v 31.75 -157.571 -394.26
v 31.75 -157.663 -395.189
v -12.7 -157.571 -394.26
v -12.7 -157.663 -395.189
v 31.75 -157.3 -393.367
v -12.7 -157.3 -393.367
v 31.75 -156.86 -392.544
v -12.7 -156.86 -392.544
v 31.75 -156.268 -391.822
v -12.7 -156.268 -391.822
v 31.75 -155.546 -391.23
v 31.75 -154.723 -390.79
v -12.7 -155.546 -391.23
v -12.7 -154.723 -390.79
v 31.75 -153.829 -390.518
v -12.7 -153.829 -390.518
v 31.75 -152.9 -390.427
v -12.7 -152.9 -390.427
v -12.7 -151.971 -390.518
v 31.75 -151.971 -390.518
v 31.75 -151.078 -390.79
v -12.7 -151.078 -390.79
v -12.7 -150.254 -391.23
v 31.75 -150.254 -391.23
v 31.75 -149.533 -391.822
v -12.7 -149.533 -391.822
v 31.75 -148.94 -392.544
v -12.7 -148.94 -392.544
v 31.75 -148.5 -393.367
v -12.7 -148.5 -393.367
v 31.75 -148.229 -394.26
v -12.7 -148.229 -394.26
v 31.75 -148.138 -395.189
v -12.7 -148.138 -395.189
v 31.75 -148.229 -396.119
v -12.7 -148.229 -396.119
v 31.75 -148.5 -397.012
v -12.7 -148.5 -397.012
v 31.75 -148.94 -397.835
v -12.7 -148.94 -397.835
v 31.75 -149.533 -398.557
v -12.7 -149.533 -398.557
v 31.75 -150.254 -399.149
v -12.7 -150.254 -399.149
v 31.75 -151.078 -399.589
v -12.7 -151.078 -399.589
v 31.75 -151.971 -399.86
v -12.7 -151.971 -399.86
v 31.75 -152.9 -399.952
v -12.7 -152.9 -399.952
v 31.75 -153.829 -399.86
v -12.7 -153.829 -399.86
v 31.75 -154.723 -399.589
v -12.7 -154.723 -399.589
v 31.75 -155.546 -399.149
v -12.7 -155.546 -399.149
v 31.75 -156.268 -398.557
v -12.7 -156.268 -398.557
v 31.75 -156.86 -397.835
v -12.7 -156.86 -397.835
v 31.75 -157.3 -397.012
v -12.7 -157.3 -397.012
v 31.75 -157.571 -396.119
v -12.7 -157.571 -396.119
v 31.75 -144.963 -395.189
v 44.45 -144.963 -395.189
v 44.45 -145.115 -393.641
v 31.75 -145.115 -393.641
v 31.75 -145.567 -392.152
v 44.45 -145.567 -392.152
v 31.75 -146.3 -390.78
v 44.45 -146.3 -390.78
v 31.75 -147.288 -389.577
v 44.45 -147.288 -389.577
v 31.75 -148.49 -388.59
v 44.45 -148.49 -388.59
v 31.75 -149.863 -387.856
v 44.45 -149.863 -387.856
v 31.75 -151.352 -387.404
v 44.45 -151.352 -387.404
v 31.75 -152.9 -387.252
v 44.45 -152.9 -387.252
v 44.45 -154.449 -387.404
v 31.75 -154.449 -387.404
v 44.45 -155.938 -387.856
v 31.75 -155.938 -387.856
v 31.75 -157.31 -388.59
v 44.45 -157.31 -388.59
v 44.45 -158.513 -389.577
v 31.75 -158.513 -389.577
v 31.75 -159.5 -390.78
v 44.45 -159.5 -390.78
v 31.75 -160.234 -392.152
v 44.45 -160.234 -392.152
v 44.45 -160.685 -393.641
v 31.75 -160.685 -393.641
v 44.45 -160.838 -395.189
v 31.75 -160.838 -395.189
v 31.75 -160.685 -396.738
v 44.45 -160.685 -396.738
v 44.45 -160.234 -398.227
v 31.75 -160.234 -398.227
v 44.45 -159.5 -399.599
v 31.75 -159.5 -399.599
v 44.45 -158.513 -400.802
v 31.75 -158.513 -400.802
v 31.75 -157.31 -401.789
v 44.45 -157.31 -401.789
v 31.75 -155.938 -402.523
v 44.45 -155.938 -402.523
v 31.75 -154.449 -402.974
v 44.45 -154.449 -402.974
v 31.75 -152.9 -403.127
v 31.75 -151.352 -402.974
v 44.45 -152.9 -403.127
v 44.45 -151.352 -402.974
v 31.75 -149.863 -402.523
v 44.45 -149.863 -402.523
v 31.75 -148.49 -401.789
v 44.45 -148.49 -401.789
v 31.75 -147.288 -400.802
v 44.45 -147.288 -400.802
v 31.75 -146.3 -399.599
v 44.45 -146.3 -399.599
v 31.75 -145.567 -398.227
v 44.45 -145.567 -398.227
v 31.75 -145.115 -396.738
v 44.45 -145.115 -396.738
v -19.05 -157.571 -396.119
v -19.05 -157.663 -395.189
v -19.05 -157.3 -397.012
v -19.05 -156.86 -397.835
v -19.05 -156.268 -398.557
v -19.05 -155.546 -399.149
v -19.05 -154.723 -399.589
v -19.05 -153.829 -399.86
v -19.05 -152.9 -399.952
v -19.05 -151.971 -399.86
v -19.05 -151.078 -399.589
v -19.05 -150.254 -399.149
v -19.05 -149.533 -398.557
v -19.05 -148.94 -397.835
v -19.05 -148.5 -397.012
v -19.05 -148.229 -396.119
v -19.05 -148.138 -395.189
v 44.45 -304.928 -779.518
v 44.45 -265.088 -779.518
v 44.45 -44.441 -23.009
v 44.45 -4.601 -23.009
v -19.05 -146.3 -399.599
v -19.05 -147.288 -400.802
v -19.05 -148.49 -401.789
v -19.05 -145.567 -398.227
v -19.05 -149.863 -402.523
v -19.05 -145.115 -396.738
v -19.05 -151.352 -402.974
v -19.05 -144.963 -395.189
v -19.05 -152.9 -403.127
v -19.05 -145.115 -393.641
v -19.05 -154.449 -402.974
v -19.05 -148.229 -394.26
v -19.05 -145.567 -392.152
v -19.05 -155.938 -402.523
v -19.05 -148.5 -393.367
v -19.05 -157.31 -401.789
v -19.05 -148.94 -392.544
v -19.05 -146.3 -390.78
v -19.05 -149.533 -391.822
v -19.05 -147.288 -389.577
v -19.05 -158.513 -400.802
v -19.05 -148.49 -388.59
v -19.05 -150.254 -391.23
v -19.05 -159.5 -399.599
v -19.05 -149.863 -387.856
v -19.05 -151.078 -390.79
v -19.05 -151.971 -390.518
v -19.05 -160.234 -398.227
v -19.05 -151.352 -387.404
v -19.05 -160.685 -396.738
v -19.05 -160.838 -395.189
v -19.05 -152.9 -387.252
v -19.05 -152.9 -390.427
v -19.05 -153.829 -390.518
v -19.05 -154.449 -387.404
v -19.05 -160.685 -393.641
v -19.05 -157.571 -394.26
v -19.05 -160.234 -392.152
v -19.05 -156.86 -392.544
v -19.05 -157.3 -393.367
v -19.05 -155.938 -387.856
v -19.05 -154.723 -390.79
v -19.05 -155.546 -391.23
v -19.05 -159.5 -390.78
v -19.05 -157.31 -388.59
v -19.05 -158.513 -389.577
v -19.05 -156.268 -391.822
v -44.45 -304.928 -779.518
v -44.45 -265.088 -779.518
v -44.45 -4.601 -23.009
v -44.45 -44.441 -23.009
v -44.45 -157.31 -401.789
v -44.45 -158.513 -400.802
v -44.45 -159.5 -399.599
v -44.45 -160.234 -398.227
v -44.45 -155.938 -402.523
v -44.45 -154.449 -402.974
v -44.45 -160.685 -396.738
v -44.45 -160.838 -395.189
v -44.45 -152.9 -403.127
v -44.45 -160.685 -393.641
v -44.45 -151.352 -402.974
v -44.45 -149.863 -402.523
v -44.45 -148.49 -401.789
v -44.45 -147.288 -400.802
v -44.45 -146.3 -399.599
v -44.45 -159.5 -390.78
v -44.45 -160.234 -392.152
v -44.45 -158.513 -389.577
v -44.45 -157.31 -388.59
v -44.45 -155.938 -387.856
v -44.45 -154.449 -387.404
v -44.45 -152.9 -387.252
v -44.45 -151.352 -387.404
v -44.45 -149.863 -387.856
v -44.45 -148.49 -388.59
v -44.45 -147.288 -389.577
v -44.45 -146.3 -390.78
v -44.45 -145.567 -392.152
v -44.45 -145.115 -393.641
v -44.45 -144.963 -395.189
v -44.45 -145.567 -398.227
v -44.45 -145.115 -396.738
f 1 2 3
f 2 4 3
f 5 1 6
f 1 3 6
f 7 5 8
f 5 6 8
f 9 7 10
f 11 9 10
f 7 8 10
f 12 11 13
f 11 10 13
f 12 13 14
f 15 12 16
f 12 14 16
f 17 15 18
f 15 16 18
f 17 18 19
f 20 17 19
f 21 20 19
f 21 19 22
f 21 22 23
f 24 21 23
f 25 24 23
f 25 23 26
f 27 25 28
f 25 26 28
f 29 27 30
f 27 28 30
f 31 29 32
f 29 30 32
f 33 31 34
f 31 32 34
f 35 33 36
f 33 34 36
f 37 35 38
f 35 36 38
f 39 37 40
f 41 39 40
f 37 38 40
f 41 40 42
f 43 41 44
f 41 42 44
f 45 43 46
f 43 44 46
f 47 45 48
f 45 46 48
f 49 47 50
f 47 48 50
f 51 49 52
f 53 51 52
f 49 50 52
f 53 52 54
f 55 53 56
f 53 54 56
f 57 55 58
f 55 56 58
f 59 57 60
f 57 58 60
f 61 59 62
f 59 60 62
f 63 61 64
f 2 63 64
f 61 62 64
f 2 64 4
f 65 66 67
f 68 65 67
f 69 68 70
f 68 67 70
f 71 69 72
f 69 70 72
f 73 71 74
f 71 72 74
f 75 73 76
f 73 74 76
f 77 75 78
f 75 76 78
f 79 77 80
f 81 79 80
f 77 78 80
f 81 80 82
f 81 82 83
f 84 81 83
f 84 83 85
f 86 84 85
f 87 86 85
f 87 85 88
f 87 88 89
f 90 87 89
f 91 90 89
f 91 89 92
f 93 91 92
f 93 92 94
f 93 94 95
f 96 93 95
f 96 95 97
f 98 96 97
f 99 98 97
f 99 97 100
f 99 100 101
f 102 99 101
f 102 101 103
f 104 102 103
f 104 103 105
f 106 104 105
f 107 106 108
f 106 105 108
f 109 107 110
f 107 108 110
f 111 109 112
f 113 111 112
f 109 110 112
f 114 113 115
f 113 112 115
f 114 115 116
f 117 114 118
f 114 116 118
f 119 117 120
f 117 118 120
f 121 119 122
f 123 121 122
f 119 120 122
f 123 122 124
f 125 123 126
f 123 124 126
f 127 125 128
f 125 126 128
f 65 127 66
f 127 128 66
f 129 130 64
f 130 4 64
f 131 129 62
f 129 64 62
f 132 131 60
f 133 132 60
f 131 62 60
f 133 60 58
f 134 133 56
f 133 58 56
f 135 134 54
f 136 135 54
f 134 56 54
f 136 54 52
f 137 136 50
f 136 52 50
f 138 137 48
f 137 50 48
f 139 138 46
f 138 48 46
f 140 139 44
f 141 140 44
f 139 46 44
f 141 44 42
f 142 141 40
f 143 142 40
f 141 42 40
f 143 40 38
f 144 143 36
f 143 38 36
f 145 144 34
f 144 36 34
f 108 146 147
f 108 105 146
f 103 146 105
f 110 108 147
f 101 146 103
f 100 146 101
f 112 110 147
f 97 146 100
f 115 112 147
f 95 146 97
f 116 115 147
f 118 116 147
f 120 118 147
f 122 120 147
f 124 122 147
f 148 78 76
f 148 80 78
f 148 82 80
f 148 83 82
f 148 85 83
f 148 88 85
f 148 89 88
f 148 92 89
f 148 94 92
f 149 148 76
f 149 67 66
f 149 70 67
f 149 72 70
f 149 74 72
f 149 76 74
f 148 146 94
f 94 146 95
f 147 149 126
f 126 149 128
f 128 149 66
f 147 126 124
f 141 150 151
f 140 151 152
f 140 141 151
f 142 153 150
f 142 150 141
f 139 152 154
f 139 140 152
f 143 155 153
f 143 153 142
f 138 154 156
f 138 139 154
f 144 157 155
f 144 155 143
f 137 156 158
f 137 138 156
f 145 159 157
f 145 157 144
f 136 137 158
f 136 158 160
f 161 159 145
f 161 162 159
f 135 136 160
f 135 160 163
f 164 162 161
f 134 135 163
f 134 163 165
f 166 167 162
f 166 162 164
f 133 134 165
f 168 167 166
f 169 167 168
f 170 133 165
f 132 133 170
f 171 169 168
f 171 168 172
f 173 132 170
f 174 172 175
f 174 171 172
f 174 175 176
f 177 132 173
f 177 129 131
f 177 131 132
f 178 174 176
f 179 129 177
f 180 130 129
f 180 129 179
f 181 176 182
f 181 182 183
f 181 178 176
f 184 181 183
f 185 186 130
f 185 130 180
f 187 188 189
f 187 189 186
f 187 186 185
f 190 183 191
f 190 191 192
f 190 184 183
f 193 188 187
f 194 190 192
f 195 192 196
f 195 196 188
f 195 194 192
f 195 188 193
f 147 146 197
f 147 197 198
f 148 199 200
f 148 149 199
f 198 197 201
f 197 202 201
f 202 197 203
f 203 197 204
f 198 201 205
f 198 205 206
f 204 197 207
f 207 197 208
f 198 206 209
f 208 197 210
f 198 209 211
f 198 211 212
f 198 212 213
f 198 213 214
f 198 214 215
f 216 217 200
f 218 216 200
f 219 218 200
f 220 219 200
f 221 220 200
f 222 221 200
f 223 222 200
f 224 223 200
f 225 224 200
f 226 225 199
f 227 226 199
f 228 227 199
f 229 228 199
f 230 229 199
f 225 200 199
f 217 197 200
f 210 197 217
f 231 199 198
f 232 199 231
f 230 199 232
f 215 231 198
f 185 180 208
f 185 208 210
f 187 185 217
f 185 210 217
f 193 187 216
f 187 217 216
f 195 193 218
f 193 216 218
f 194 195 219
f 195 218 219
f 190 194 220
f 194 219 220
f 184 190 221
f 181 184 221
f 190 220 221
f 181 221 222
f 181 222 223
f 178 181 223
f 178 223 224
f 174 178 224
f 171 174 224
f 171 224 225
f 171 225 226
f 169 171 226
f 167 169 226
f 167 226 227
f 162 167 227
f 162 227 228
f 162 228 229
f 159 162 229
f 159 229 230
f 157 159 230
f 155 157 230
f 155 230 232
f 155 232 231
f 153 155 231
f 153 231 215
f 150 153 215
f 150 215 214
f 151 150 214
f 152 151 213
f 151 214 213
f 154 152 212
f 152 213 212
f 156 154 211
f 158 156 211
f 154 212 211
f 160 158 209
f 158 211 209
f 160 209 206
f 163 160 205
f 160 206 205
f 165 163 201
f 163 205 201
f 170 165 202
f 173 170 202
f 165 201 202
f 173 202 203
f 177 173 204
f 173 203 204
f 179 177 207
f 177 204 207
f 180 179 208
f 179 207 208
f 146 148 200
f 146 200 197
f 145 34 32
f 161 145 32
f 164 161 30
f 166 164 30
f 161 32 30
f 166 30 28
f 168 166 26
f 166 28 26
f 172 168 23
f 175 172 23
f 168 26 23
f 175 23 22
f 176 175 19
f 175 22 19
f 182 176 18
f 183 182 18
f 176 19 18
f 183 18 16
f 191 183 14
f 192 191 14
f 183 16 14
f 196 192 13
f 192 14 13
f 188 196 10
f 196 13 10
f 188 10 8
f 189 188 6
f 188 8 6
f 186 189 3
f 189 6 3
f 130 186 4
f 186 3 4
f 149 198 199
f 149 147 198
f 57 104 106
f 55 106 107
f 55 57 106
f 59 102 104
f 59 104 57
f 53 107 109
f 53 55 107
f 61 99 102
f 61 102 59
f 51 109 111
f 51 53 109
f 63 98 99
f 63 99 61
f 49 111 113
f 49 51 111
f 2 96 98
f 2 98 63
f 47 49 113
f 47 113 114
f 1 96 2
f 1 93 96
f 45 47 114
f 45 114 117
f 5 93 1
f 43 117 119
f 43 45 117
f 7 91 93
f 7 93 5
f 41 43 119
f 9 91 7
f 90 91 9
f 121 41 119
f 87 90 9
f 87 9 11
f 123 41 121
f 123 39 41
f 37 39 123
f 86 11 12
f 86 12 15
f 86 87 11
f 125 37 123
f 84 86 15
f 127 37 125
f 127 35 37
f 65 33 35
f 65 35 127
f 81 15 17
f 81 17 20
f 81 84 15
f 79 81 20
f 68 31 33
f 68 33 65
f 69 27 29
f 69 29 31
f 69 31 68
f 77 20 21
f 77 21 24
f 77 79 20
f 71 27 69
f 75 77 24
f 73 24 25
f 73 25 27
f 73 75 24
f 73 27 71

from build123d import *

# Parameters (mm, degrees)
F1_DEPTH       = 44.45
F1_DEPTH_BACK  = 44.45
F3_D           = 9.525
F3_DEPTH       = 31.75
F3_CBORE_D     = 15.875
F3_CBORE_DEPTH = 25.4
F5_D           = 9.525
F5_CBORE_D     = 15.875
F5_CBORE_DEPTH = 12.7


with BuildPart() as f1:
    # F0 (on Right) → F1 (new body, two sides)
    with BuildSketch(Plane.YZ) as f1_sk:
        Polygon((-4.600528, -23.008825), (-44.441384, -23.008825), (-304.928464, -779.518237), (-265.087608, -779.518237), align=None)
    extrude(amount=F1_DEPTH)
    extrude(f1_sk.sketch, amount=-F1_DEPTH_BACK)

    # F3
    with Locations(Plane(origin=(-44.45, 0, 0), x_dir=(0, -1, 0), z_dir=(-1, 0, 0))):
        with Locations((152.900278, -395.189479)):
            CounterBoreHole(F3_D / 2, F3_CBORE_D / 2, F3_CBORE_DEPTH, depth=F3_DEPTH)

    # F5 (through all)
    with Locations(Plane.YZ.offset(44.45)):
        with Locations((-152.900278, -395.189479)):
            CounterBoreHole(F5_D / 2, F5_CBORE_D / 2, F5_CBORE_DEPTH)


solid = f1.part
